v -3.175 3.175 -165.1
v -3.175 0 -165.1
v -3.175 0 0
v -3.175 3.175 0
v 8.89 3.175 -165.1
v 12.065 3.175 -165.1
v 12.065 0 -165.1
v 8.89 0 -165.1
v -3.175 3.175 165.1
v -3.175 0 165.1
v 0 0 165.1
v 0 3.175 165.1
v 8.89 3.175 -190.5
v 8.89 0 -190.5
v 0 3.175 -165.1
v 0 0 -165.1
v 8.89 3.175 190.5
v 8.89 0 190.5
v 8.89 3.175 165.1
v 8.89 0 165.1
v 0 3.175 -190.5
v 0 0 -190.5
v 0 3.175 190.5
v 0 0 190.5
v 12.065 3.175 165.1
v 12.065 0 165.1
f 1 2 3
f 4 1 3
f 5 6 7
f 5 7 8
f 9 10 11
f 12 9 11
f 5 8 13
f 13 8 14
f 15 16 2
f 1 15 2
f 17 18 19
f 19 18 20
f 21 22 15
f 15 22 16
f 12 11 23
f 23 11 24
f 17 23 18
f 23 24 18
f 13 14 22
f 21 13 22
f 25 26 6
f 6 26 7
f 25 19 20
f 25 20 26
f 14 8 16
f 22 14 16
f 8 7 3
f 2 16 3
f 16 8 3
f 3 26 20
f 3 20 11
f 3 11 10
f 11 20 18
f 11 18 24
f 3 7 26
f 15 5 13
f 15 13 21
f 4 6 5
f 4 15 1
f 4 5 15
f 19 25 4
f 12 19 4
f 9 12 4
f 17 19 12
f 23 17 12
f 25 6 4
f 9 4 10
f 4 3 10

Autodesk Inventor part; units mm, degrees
ref_plane "YZ Plane" through (0, 0, 0) normal (1, 0, 0) x (0, 1, 0)
ref_plane "XZ Plane" through (0, 0, 0) normal (0, 1, 0) x (-1, 0, 0)
ref_plane "XY Plane" through (0, 0, 0) normal (0, 0, 1) x (1, 0, 0)
sketch "Sketch1" plane through (0, 0, 0) normal (0, 1, 0) x (-1, 0, 0)
  line L0 (3.175, 0) -> (3.175, 165.1)
  line L1 (3.175, 165.1) -> (0, 165.1)
  line L2 (0, 165.1) -> (0, 190.5)
  line L3 (0, 190.5) -> (-8.89, 190.5)
  line L4 (-8.89, 190.5) -> (-8.89, 165.1)
  line L5 (-8.89, 165.1) -> (-12.065, 165.1)
  line L6 (-12.065, 165.1) -> (-12.065, -165.1)
  line L7 (-12.065, -165.1) -> (-8.89, -165.1)
  line L8 (-8.89, -165.1) -> (-8.89, -190.5)
  line L9 (-8.89, -190.5) -> (0, -190.5)
  line L10 (0, -190.5) -> (0, -165.1)
  line L11 (0, -165.1) -> (3.175, -165.1)
  line L12 (3.175, -165.1) -> (3.175, 0)
  point P0 (0, 0)
  dimension "d0" = 165.1
  dimension "d1" = 3.175
  dimension "d2" = 25.4
  dimension "d3" = 8.89
  dimension "d4" = 25.4
  dimension "d5" = 3.175
  dimension "d6" = 90
  dimension "d7" = 330.2
  dimension "d8" = 3.175
  dimension "d9" = 25.4
  dimension "d10" = 8.89
  dimension "d11" = 25.4
  dimension "d12" = 3.175
extrude "Extrusion1" add sketch "Sketch1" along normal blind 3.175
properties part number "front"
